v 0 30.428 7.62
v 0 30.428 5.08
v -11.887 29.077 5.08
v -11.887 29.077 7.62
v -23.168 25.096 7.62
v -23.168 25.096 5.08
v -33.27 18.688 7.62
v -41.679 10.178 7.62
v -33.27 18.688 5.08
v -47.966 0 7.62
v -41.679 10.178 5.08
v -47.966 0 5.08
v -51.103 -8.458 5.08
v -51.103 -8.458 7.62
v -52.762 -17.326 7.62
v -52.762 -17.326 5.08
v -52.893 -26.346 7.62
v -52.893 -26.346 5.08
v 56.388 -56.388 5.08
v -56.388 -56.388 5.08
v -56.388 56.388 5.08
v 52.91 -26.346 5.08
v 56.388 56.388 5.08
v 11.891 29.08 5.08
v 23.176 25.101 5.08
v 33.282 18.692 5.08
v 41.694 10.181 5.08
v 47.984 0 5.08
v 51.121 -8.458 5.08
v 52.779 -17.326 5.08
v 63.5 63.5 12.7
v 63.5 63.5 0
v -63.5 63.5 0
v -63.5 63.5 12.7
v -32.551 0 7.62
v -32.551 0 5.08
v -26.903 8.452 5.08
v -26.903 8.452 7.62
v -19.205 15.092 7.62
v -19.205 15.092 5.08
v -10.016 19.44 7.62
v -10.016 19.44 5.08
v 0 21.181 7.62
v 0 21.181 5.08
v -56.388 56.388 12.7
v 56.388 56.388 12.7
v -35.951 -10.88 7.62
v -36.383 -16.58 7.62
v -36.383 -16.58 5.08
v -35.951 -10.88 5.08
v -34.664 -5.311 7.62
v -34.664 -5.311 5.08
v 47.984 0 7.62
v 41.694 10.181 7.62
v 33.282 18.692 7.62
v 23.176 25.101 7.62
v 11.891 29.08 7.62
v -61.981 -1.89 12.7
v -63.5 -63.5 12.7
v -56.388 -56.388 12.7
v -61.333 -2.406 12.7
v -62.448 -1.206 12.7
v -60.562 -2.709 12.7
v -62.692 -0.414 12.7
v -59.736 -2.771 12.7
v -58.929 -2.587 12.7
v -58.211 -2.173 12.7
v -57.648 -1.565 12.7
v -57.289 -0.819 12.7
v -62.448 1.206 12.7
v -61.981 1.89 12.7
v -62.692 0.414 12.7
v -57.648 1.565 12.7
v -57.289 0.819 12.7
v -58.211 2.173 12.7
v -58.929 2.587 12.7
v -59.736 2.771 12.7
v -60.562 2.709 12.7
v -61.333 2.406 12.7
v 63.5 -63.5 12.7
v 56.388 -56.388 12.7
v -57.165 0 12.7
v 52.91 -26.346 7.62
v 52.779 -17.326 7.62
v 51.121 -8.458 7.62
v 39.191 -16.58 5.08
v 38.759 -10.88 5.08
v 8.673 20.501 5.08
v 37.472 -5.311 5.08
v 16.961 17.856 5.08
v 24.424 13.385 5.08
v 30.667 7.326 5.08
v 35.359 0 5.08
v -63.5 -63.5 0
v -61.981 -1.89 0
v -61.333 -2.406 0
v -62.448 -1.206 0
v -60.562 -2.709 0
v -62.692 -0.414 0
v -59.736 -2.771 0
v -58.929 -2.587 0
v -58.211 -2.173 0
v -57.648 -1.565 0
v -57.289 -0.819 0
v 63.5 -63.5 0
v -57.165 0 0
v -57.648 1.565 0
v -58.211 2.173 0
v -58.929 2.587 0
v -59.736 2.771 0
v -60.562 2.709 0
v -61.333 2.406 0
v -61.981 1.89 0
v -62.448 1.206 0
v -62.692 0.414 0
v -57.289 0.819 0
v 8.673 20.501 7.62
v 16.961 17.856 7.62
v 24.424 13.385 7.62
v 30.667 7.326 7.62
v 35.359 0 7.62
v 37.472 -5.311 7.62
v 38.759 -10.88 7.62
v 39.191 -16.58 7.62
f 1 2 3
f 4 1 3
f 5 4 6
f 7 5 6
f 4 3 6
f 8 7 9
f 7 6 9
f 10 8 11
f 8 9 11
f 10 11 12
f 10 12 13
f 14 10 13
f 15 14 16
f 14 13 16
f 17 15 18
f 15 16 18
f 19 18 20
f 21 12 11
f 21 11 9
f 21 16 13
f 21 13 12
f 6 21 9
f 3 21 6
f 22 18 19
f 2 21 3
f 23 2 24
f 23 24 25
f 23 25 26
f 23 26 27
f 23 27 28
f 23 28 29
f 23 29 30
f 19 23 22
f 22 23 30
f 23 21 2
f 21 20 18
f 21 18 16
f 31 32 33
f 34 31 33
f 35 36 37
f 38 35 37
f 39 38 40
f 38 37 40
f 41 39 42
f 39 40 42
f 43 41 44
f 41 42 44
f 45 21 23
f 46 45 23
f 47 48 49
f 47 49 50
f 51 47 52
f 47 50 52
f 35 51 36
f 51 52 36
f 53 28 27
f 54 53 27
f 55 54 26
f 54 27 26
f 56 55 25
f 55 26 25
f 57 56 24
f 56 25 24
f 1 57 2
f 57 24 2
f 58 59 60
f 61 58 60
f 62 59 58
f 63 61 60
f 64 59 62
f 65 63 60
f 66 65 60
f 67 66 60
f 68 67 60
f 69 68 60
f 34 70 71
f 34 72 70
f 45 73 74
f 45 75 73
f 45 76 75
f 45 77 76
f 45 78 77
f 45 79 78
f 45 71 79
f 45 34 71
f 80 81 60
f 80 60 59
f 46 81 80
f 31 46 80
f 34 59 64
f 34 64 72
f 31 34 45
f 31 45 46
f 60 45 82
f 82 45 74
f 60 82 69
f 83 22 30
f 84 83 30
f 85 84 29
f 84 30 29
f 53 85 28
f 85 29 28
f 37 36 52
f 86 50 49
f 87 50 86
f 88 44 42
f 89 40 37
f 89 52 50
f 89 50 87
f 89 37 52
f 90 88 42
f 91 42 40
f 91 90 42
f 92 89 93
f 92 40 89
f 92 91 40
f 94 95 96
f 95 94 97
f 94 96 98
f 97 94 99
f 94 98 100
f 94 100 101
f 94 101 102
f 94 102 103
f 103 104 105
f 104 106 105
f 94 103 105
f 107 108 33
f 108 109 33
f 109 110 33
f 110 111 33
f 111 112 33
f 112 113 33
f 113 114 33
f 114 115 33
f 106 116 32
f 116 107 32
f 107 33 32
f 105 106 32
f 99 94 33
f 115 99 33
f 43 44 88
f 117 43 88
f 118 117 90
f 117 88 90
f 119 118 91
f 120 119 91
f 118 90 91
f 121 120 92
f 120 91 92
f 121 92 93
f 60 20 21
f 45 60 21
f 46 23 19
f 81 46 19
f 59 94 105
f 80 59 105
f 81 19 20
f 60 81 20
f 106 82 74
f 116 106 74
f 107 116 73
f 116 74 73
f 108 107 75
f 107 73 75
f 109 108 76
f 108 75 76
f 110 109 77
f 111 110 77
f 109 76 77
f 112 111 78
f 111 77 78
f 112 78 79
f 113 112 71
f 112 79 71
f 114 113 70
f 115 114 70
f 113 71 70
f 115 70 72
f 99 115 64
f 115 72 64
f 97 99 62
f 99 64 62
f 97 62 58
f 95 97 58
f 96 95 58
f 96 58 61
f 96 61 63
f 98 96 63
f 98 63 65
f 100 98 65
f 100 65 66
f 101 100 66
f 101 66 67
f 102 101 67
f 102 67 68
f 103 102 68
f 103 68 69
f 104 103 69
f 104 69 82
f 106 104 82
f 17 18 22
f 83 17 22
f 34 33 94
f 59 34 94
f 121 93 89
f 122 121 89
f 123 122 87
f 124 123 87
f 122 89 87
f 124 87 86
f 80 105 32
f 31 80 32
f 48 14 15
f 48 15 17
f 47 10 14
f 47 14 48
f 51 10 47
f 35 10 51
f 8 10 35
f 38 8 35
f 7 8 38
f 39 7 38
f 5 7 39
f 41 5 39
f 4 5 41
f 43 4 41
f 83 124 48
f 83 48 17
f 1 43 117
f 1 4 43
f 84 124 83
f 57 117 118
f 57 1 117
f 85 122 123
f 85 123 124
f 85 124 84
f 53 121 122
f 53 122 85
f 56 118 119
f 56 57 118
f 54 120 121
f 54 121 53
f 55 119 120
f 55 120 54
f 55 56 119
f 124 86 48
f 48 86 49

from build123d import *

# Parameters (mm, degrees)
F1_DEPTH = 12.7
F2_DEPTH = 5.08
F3_DEPTH = 7.62
F4_DEPTH = 5.08
F6_DEPTH = 25.4


with BuildPart() as f1:
    # F0 (on Top) → F1 (new body)
    with BuildSketch(Plane.XY):
        Polygon((56.388, -56.388), (0, -56.388), (0, -63.5), (63.5, -63.5), (63.5, 0), (56.388, 0), align=None)
        Polygon((0, -63.5), (0, -56.388), (-56.388, -56.388), (-56.388, 0), (-56.388, 56.388), (0, 56.388), (0, 63.5), (-63.5, 63.5), (-63.5, 0), (-63.5, -63.5), align=None)
        Polygon((0, 63.5), (0, 56.388), (56.388, 56.388), (56.388, 0), (63.5, 0), (63.5, 63.5), align=None)
    extrude(amount=F1_DEPTH)

    # F0 (on Top) → F2 (join)
    with BuildSketch(Plane.XY):
        with BuildLine():
            ThreePointArc((-47.9661298667, 0), (-28.400414984, 22.1775554869), (0, 30.4284702836))
            Line((0, 30.4284702836), (0, 56.388))
            Line((0, 56.388), (-56.388, 56.388))
            Line((-56.388, 56.388), (-56.388, 0))
            Line((-56.388, 0), (-47.9661298667, 0))
        make_face()
        with BuildLine():
            Line((0, 56.388), (0, 30.4284702836))
            ThreePointArc((0, 30.4284702836), (28.4104578527, 22.1822105281), (47.9835120713, 0))
            Line((47.9835120713, 0), (56.388, 0))
            Line((56.388, 0), (56.388, 56.388))
            Line((56.388, 56.388), (0, 56.388))
        make_face()
        with BuildLine():
            Line((52.9104024172, -26.3461358845), (0, -26.3461358845))
            Line((0, -26.3461358845), (0, -56.388))
            Line((0, -56.388), (56.388, -56.388))
            Line((56.388, -56.388), (56.388, 0))
            Line((56.388, 0), (47.9835120713, 0))
            ThreePointArc((47.9835120713, 0), (52.1388015032, -12.8566826028), (52.9104024172, -26.3461358845))
        make_face()
        with BuildLine():
            Line((0, -56.388), (0, -26.3461358845))
            Line((0, -26.3461358845), (-52.8930202127, -26.3461358845))
            ThreePointArc((-52.8930202127, -26.3461358845), (-52.1214192987, -12.8566826028), (-47.9661298667, 0))
            Line((-47.9661298667, 0), (-56.388, 0))
            Line((-56.388, 0), (-56.388, -56.388))
            Line((-56.388, -56.388), (0, -56.388))
        make_face()
    extrude(amount=F2_DEPTH)

    # F0 (on Top) → F3 (join)
    with BuildSketch(Plane.XY):
        with BuildLine():
            ThreePointArc((-32.5514706385, 0), (-19.2050810918, 15.0924405208), (0, 21.181178901))
            Line((0, 21.181178901), (0, 30.4284702836))
            ThreePointArc((0, 30.4284702836), (-28.400414984, 22.1775554869), (-47.9661298667, 0))
            Line((-47.9661298667, 0), (-32.5514706385, 0))
        make_face()
        with BuildLine():
            Line((0, -26.3461358845), (0, -16.5796671063))
            Line((0, -16.5796671063), (-36.3830365241, -16.5796671063))
            ThreePointArc((-36.3830365241, -16.5796671063), (-35.412685982, -8.0713438506), (-32.5514706385, 0))
            Line((-32.5514706385, 0), (-47.9661298667, 0))
            ThreePointArc((-47.9661298667, 0), (-52.1214192987, -12.8566826028), (-52.8930202127, -26.3461358845))
            Line((-52.8930202127, -26.3461358845), (0, -26.3461358845))
        make_face()
        with BuildLine():
            Line((39.1908325255, -16.5796671063), (0, -16.5796671063))
            Line((0, -16.5796671063), (0, -26.3461358845))
            Line((0, -26.3461358845), (52.9104024172, -26.3461358845))
            ThreePointArc((52.9104024172, -26.3461358845), (52.1388015032, -12.8566826028), (47.9835120713, 0))
            Line((47.9835120713, 0), (35.3592666399, 0))
            ThreePointArc((35.3592666399, 0), (38.2204819834, -8.0713438506), (39.1908325255, -16.5796671063))
        make_face()
        with BuildLine():
            Line((0, 30.4284702836), (0, 21.181178901))
            ThreePointArc((0, 21.181178901), (20.8219345928, 15.8362591598), (35.3592666399, 0))
            Line((35.3592666399, 0), (47.9835120713, 0))
            ThreePointArc((47.9835120713, 0), (28.4104578527, 22.1822105281), (0, 30.4284702836))
        make_face()
    extrude(amount=F3_DEPTH)

    # F0 (on Top) → F4 (join)
    with BuildSketch(Plane.XY):
        with BuildLine():
            Line((-32.5514706385, 0), (0, 0))
            Line((0, 0), (0, 21.181178901))
            ThreePointArc((0, 21.181178901), (-19.2050810918, 15.0924405208), (-32.5514706385, 0))
        make_face()
        with BuildLine():
            Line((0, 21.181178901), (0, 0))
            Line((0, 0), (35.3592666399, 0))
            ThreePointArc((35.3592666399, 0), (20.8219345928, 15.8362591598), (0, 21.181178901))
        make_face()
        with BuildLine():
            Line((35.3592666399, 0), (0, 0))
            Line((0, 0), (0, -16.5796671063))
            Line((0, -16.5796671063), (39.1908325255, -16.5796671063))
            ThreePointArc((39.1908325255, -16.5796671063), (38.2204819834, -8.0713438506), (35.3592666399, 0))
        make_face()
        with BuildLine():
            Line((0, -16.5796671063), (0, 0))
            Line((0, 0), (-32.5514706385, 0))
            ThreePointArc((-32.5514706385, 0), (-35.412685982, -8.0713438506), (-36.3830365241, -16.5796671063))
            Line((-36.3830365241, -16.5796671063), (0, -16.5796671063))
        make_face()
    extrude(amount=F4_DEPTH)

    # F5 (on face) → F6 (cut)
    with BuildSketch(Plane.XY.offset(12.7)):
        with BuildLine():
            ThreePointArc((-62.7227567186, 0), (-59.944, -2.7787567186), (-57.1652432814, 0))
            Line((-57.1652432814, 0), (-62.7227567186, 0))
        make_face()
        with BuildLine():
            Line((-62.7227567186, 0), (-57.1652432814, 0))
            ThreePointArc((-57.1652432814, 0), (-59.944, 2.7787567186), (-62.7227567186, 0))
        make_face()
    extrude(amount=-F6_DEPTH, mode=Mode.SUBTRACT)


solid = f1.part
